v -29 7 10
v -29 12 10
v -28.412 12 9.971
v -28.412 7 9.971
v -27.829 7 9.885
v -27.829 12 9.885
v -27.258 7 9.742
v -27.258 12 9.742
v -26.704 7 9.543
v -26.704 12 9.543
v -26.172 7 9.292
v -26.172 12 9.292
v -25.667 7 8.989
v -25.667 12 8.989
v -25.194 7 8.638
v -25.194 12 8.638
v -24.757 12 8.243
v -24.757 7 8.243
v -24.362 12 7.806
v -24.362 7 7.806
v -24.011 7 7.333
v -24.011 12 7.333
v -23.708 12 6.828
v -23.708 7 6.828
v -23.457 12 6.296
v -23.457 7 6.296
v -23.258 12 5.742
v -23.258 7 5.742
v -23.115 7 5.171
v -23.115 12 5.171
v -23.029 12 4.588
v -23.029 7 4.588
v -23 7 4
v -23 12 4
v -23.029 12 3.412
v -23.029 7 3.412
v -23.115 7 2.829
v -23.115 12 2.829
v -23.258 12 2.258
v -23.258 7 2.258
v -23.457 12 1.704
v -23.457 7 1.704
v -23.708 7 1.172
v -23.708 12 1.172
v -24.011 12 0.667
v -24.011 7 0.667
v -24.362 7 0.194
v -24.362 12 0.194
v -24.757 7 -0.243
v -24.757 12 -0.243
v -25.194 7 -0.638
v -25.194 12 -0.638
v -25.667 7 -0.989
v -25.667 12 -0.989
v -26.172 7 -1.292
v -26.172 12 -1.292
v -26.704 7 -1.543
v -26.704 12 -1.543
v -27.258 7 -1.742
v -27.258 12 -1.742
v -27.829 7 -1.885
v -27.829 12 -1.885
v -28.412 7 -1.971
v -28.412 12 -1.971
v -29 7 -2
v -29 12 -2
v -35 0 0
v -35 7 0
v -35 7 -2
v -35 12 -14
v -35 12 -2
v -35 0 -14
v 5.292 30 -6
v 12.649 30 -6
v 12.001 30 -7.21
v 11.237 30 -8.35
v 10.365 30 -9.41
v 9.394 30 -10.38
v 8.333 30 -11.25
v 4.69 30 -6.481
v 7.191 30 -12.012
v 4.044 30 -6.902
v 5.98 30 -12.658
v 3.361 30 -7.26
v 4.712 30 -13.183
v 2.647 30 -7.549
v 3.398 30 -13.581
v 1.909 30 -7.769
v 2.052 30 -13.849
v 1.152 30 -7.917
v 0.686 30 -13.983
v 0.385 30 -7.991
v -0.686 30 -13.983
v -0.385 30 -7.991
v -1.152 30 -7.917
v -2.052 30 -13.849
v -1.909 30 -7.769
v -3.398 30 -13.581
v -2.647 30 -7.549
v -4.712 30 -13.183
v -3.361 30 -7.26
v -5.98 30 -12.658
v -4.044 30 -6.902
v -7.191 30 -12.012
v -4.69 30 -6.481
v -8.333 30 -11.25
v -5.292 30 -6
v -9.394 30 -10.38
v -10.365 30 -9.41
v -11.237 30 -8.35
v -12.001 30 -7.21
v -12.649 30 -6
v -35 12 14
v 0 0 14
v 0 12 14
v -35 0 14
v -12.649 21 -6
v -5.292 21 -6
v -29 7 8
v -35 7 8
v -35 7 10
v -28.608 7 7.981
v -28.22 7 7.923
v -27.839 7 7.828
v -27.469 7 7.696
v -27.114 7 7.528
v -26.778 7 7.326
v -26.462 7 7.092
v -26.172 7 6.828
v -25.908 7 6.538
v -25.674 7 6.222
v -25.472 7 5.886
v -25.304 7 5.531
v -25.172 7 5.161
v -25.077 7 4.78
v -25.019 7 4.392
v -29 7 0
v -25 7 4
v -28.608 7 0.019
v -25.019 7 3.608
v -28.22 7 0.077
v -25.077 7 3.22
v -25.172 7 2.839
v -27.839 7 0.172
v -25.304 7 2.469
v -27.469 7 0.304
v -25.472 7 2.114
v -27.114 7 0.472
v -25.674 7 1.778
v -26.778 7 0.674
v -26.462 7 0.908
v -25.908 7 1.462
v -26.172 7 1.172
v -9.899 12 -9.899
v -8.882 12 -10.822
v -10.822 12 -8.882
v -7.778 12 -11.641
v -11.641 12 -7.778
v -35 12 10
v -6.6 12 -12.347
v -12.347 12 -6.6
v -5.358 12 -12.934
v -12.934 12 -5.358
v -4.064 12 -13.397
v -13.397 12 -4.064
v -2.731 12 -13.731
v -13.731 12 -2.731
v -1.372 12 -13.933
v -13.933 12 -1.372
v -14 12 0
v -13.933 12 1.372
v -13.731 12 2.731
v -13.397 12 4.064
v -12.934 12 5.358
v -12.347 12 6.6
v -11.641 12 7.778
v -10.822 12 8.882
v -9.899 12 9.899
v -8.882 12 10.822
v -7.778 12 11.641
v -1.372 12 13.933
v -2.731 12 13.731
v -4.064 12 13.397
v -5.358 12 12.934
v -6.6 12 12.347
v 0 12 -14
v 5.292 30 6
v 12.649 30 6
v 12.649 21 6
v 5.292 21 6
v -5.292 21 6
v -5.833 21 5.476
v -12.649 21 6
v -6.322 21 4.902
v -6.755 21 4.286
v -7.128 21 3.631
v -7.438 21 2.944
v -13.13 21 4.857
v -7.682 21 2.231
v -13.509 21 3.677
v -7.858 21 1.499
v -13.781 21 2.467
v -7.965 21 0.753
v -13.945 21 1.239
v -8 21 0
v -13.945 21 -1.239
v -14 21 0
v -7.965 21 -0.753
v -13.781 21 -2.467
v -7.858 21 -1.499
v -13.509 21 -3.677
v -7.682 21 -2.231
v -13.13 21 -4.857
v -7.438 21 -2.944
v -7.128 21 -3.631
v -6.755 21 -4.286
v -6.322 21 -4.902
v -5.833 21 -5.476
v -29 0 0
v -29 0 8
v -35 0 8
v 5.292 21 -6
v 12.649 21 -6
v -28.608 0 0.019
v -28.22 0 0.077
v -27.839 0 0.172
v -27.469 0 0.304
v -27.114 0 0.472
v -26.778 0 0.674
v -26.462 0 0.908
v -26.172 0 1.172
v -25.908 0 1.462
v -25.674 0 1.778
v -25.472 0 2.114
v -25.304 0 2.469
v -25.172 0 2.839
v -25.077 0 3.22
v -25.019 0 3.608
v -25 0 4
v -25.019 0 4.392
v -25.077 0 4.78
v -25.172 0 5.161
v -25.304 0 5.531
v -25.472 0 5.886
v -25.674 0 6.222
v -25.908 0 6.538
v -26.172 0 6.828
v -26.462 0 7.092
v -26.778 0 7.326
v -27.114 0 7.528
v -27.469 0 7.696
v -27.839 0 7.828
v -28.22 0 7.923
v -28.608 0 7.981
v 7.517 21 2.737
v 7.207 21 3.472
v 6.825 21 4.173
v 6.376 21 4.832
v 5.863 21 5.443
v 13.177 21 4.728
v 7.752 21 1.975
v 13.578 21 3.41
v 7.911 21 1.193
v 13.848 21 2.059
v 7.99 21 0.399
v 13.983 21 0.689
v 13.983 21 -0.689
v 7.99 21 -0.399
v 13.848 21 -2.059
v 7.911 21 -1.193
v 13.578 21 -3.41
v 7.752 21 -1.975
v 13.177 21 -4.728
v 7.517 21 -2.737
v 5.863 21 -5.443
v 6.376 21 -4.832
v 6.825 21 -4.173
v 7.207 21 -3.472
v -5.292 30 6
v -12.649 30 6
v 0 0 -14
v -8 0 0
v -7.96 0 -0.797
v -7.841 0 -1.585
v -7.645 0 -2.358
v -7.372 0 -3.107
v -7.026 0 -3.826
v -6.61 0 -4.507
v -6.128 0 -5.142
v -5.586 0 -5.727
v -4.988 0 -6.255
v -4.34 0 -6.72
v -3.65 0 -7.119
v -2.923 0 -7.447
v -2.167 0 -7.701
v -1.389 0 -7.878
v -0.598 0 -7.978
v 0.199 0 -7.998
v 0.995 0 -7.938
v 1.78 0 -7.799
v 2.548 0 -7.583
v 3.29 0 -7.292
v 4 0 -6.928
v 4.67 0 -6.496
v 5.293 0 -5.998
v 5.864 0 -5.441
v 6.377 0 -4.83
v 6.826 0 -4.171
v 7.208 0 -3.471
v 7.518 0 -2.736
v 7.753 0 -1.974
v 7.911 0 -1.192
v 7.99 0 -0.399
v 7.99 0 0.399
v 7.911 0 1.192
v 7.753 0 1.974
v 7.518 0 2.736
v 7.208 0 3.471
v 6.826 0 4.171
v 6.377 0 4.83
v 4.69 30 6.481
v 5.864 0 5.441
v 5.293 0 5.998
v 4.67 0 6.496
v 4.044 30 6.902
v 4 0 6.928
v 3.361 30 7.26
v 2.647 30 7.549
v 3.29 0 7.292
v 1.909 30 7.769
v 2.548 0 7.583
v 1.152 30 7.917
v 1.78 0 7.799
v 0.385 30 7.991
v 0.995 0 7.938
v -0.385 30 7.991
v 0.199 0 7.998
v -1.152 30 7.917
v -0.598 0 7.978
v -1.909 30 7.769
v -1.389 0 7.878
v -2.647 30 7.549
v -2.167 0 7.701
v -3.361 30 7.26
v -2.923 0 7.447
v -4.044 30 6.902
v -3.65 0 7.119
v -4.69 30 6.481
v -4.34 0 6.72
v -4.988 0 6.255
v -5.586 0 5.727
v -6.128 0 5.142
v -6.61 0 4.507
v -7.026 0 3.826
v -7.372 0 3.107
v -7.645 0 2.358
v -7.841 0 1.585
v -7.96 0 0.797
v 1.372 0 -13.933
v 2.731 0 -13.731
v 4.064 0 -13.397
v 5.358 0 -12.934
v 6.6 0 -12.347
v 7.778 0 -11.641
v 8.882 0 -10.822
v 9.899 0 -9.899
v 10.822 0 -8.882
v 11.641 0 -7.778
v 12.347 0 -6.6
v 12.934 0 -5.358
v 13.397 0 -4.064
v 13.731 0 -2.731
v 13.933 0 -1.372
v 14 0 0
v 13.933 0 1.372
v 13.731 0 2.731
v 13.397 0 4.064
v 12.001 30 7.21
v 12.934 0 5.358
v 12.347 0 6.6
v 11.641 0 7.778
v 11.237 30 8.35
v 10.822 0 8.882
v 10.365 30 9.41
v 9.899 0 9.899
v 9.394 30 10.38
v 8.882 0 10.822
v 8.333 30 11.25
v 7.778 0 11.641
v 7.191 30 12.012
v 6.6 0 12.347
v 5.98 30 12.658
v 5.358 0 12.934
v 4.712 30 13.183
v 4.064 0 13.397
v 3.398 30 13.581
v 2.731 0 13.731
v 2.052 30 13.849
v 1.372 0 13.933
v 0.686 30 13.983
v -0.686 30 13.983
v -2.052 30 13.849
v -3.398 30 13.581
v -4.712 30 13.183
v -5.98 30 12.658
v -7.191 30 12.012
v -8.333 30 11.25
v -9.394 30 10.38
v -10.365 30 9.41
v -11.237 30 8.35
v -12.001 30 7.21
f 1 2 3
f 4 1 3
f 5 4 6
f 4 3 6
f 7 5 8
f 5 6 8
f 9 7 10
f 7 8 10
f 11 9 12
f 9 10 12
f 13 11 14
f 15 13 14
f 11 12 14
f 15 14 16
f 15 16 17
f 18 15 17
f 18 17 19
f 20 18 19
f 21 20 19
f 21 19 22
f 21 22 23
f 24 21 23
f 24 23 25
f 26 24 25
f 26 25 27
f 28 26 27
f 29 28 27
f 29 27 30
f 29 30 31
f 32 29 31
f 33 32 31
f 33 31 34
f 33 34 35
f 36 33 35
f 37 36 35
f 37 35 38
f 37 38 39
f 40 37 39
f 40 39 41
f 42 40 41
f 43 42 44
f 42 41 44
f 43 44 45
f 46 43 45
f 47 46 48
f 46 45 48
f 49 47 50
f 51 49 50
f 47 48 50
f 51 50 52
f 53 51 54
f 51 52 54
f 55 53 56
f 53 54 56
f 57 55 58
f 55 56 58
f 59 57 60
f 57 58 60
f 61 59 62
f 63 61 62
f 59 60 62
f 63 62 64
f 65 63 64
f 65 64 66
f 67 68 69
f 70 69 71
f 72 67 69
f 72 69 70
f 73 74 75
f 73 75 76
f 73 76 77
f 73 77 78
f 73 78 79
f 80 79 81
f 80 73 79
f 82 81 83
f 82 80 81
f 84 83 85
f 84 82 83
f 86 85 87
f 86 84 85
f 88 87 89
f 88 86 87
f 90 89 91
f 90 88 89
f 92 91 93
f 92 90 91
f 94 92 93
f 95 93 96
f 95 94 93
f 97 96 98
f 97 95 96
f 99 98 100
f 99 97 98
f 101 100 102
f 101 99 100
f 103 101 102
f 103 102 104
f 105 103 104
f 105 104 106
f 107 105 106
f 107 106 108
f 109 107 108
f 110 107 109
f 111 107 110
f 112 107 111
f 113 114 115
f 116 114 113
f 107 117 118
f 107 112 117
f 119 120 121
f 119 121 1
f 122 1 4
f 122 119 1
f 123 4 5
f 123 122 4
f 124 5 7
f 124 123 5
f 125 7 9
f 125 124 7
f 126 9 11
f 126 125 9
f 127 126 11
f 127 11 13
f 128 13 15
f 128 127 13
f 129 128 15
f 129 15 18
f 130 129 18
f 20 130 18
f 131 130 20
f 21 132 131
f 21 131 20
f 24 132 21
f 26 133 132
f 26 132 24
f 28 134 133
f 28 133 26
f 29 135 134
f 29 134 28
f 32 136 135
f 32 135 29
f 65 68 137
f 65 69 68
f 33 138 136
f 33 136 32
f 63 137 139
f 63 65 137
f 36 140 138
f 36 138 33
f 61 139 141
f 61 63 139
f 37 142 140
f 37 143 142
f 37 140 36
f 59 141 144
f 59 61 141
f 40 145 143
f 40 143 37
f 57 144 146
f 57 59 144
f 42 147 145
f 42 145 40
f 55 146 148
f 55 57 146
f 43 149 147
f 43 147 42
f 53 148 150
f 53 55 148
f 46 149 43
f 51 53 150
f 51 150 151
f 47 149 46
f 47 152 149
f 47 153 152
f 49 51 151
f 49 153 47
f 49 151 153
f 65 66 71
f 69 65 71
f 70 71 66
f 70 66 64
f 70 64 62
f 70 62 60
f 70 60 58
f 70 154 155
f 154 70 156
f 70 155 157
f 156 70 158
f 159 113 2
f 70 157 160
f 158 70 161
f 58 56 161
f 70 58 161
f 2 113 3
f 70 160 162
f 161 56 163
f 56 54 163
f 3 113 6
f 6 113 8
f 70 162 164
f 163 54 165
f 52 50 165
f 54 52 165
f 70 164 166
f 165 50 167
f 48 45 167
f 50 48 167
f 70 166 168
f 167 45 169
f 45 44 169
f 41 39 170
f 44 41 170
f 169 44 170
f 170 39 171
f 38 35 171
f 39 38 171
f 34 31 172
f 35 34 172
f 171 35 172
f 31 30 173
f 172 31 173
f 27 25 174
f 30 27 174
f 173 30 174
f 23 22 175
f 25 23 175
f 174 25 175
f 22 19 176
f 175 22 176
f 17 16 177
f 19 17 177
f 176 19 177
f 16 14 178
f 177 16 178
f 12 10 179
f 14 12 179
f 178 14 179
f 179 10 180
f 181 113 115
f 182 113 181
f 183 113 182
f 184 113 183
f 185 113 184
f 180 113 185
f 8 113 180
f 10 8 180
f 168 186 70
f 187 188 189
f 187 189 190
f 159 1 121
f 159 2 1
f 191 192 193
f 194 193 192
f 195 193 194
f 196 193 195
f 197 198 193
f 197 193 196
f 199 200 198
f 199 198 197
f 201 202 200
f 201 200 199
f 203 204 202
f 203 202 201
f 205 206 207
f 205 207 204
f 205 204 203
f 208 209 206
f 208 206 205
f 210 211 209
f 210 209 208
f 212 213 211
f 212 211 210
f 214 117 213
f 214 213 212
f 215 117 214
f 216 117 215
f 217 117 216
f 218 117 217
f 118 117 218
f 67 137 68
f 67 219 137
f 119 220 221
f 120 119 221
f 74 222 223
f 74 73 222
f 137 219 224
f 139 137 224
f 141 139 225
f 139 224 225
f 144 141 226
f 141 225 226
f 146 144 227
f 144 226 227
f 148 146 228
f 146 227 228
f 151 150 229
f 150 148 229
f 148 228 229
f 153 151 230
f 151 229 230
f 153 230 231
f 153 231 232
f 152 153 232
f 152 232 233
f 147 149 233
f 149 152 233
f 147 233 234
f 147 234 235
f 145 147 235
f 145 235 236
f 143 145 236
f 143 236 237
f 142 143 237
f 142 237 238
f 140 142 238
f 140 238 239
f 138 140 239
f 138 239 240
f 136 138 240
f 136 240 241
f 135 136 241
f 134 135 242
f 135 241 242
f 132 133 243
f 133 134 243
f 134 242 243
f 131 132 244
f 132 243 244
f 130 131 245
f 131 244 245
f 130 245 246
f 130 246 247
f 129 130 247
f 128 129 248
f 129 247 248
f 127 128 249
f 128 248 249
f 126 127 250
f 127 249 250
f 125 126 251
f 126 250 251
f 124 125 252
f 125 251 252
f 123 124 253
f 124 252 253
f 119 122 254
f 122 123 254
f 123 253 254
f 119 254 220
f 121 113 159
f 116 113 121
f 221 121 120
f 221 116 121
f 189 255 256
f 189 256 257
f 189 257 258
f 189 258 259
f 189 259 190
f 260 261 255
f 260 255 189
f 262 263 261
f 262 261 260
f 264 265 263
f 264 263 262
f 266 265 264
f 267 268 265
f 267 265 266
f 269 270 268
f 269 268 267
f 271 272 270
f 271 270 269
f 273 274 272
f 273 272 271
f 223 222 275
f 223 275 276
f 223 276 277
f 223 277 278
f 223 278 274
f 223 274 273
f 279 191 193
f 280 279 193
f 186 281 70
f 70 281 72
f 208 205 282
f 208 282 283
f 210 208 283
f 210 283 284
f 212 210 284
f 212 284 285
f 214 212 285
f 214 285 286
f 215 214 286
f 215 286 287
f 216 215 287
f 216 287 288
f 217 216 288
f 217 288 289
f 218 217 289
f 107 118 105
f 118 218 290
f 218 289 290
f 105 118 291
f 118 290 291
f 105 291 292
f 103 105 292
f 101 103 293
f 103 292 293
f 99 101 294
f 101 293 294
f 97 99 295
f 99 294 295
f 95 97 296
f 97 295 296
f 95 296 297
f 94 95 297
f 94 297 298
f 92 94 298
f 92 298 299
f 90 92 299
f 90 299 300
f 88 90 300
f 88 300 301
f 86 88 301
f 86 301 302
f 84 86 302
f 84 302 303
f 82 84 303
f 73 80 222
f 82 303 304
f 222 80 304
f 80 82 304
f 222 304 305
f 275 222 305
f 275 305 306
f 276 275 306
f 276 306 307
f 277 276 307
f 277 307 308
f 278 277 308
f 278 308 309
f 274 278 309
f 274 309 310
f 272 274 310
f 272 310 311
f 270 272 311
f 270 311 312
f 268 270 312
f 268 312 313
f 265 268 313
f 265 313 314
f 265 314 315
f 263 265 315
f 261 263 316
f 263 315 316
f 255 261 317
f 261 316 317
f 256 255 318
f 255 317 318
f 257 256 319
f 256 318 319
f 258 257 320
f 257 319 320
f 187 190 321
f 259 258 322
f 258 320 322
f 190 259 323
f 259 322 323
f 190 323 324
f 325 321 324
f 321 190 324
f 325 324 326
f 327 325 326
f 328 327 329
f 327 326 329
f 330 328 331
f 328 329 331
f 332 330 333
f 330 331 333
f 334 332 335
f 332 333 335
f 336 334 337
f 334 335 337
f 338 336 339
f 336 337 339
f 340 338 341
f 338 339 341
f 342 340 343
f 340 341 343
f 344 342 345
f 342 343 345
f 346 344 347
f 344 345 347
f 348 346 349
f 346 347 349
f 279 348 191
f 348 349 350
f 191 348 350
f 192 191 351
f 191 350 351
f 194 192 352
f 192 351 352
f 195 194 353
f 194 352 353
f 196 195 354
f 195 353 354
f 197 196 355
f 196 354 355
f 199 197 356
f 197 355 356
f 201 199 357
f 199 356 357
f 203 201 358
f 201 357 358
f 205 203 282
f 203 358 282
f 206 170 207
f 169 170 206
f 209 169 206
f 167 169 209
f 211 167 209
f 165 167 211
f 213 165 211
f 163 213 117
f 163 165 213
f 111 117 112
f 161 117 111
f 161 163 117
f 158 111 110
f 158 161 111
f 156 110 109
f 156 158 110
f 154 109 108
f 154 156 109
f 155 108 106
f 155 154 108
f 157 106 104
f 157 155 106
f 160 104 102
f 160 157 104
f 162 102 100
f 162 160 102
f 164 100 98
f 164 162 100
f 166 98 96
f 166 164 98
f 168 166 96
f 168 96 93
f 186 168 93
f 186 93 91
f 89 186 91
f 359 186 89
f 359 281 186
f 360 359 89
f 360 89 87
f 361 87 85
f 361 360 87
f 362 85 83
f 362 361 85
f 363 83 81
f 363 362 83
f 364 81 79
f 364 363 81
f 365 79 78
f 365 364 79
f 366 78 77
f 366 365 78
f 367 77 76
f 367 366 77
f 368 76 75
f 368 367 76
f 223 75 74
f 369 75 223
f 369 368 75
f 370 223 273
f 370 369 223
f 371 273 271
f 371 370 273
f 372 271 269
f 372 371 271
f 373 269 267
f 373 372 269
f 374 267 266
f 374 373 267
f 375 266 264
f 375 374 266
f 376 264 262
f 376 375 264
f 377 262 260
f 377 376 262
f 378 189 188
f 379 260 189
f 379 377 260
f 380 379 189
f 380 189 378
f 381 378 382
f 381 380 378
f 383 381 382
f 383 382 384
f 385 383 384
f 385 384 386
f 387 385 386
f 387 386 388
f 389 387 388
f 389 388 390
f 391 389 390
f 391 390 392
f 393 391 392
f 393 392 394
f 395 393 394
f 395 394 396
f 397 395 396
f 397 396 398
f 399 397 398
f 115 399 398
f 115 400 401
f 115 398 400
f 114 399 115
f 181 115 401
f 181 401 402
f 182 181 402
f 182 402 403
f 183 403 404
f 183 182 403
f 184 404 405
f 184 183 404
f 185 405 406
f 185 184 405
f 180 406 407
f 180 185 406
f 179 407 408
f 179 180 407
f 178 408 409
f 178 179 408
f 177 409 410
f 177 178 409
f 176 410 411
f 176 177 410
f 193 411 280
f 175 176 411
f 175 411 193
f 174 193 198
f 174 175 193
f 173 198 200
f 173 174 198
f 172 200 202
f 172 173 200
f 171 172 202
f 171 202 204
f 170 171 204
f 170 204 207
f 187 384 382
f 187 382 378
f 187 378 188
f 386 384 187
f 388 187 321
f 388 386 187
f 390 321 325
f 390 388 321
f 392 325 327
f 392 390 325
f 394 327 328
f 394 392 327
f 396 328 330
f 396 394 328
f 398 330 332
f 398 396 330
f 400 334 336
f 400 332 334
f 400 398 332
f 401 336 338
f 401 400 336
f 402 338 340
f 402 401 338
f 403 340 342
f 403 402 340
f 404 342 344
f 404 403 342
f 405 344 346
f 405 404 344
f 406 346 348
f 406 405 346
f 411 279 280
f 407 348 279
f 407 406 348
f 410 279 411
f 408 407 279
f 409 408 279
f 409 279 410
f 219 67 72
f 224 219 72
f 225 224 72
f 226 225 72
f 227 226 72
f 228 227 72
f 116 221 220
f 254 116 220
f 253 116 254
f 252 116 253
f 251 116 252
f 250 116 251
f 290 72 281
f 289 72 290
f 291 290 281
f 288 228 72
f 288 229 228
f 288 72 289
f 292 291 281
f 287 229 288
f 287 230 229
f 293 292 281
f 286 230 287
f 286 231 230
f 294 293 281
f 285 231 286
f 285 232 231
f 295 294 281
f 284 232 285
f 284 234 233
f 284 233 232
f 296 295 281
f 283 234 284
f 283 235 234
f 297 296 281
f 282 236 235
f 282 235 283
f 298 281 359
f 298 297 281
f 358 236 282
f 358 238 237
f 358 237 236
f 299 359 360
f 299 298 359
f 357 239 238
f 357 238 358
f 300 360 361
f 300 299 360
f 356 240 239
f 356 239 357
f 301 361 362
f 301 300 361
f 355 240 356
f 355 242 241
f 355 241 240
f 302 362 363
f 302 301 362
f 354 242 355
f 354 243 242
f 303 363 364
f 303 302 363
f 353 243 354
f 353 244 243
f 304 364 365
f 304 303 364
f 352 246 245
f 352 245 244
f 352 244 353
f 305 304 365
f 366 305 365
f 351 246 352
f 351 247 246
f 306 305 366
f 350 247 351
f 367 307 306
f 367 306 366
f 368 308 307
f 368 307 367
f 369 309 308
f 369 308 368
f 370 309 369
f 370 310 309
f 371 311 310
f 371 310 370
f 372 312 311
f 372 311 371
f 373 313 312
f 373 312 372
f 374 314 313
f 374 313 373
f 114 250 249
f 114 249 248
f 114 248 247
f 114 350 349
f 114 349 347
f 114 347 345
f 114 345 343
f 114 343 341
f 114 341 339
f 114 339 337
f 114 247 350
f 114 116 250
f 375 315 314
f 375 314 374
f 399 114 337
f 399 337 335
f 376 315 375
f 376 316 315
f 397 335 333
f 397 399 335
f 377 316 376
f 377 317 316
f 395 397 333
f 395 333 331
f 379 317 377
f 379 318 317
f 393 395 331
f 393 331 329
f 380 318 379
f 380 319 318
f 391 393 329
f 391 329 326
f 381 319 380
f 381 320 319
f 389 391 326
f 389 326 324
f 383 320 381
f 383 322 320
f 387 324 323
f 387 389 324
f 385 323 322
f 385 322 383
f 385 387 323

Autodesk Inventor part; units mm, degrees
ref_plane "YZ Plane" through (0, 0, 0) normal (1, 0, 0) x (0, 1, 0)
ref_plane "XZ Plane" through (0, 0, 0) normal (0, 1, 0) x (-1, 0, 0)
ref_plane "XY Plane" through (0, 0, 0) normal (0, 0, 1) x (1, 0, 0)
sketch "草图1" plane through (0, 0, 0) normal (0, 1, 0) x (-1, 0, 0)
  circle A0 centre (0, 0) radius 8
  circle A1 centre (0, 0) radius 14
  dimension "d0" = 16
  dimension "d1" = 28
extrude "拉伸1" add sketch "草图1" along normal blind 30
sketch "草图2" plane through (0, 30, 0) normal (0, 1, 0) x (1, 0, 0)
  circle A0 centre (0, 0) radius 14 projected
  line L0 (18.1173, -6) -> (-18.1173, -6)
  line L1 (-18.1173, -6) -> (-18.1173, 6)
  line L2 (-18.1173, 6) -> (18.1173, 6)
  line L3 (18.1173, 6) -> (18.1173, -6)
  line L4 (18.1173, -6) -> (-18.1173, 6) construction
  line L5 (-18.1173, -6) -> (18.1173, 6) construction
  dimension "d4" = 12
  dimension "d5" = 36.2346
extrude "拉伸2" cut sketch "草图2" against normal blind 9 contours A0 L0 L2 | A0 L2 L3 L0 | A0 L0 L1 L2
sketch "草图3" plane through (0, 0, 0) normal (0, -1, 0) x (1, 0, 0)
  circle A0 centre (0, 0) radius 14 projected
  line L0 (0, 14) -> (-35, 14)
  line L1 (0, -14) -> (-35, -14)
  line L2 (-41.9506, 4) -> (-20.5959, 4)
  arc A1 (-29, 0) -> (-29, 8) centre (-29, 4) ccw
  line L3 (-29, 8) -> (-35, 8)
  line L4 (-29, 0) -> (-35, 0)
  line L5 (-35, 14) -> (-35, 8)
  line L6 (-35, 0) -> (-35, -14)
  dimension "d8" = 8
  dimension "d9" = 35
  dimension "d10" = 35
  dimension "d11" = 6
  dimension "d12" = 6
sketch "草图4" plane through (0, 0, 0) normal (0, -1, 0) x (1, 0, 0)
  circle A0 centre (0, 0) radius 8 projected
  circle A1 centre (0, 0) radius 14 projected
extrude "拉伸3" add sketch "草图3" against normal blind 12 contours A0 L1 L6 L4 A1 L3 L5 L0
sketch "草图5" plane through (0, 12, 0) normal (0, 1, 0) x (1, 0, 0)
  line L0 (-35, 14) -> (-35, 0) projected
  line L1 (-35, 0) -> (-29, 0) projected
  arc A0 (-29, -8) -> (-29, 0) centre (-29, -4) ccw projected
  line L2 (-29, -8) -> (-35, -8) projected
  line L3 (-35, -8) -> (-35, -14) projected
  arc A1 (-29, -10) -> (-29, 2) centre (-29, -4) ccw
  line L4 (-29, 2) -> (-35, 2)
  line L5 (-29, -10) -> (-35, -10)
  dimension "d15" = 12
extrude "拉伸4" cut sketch "草图5" against normal blind 5
